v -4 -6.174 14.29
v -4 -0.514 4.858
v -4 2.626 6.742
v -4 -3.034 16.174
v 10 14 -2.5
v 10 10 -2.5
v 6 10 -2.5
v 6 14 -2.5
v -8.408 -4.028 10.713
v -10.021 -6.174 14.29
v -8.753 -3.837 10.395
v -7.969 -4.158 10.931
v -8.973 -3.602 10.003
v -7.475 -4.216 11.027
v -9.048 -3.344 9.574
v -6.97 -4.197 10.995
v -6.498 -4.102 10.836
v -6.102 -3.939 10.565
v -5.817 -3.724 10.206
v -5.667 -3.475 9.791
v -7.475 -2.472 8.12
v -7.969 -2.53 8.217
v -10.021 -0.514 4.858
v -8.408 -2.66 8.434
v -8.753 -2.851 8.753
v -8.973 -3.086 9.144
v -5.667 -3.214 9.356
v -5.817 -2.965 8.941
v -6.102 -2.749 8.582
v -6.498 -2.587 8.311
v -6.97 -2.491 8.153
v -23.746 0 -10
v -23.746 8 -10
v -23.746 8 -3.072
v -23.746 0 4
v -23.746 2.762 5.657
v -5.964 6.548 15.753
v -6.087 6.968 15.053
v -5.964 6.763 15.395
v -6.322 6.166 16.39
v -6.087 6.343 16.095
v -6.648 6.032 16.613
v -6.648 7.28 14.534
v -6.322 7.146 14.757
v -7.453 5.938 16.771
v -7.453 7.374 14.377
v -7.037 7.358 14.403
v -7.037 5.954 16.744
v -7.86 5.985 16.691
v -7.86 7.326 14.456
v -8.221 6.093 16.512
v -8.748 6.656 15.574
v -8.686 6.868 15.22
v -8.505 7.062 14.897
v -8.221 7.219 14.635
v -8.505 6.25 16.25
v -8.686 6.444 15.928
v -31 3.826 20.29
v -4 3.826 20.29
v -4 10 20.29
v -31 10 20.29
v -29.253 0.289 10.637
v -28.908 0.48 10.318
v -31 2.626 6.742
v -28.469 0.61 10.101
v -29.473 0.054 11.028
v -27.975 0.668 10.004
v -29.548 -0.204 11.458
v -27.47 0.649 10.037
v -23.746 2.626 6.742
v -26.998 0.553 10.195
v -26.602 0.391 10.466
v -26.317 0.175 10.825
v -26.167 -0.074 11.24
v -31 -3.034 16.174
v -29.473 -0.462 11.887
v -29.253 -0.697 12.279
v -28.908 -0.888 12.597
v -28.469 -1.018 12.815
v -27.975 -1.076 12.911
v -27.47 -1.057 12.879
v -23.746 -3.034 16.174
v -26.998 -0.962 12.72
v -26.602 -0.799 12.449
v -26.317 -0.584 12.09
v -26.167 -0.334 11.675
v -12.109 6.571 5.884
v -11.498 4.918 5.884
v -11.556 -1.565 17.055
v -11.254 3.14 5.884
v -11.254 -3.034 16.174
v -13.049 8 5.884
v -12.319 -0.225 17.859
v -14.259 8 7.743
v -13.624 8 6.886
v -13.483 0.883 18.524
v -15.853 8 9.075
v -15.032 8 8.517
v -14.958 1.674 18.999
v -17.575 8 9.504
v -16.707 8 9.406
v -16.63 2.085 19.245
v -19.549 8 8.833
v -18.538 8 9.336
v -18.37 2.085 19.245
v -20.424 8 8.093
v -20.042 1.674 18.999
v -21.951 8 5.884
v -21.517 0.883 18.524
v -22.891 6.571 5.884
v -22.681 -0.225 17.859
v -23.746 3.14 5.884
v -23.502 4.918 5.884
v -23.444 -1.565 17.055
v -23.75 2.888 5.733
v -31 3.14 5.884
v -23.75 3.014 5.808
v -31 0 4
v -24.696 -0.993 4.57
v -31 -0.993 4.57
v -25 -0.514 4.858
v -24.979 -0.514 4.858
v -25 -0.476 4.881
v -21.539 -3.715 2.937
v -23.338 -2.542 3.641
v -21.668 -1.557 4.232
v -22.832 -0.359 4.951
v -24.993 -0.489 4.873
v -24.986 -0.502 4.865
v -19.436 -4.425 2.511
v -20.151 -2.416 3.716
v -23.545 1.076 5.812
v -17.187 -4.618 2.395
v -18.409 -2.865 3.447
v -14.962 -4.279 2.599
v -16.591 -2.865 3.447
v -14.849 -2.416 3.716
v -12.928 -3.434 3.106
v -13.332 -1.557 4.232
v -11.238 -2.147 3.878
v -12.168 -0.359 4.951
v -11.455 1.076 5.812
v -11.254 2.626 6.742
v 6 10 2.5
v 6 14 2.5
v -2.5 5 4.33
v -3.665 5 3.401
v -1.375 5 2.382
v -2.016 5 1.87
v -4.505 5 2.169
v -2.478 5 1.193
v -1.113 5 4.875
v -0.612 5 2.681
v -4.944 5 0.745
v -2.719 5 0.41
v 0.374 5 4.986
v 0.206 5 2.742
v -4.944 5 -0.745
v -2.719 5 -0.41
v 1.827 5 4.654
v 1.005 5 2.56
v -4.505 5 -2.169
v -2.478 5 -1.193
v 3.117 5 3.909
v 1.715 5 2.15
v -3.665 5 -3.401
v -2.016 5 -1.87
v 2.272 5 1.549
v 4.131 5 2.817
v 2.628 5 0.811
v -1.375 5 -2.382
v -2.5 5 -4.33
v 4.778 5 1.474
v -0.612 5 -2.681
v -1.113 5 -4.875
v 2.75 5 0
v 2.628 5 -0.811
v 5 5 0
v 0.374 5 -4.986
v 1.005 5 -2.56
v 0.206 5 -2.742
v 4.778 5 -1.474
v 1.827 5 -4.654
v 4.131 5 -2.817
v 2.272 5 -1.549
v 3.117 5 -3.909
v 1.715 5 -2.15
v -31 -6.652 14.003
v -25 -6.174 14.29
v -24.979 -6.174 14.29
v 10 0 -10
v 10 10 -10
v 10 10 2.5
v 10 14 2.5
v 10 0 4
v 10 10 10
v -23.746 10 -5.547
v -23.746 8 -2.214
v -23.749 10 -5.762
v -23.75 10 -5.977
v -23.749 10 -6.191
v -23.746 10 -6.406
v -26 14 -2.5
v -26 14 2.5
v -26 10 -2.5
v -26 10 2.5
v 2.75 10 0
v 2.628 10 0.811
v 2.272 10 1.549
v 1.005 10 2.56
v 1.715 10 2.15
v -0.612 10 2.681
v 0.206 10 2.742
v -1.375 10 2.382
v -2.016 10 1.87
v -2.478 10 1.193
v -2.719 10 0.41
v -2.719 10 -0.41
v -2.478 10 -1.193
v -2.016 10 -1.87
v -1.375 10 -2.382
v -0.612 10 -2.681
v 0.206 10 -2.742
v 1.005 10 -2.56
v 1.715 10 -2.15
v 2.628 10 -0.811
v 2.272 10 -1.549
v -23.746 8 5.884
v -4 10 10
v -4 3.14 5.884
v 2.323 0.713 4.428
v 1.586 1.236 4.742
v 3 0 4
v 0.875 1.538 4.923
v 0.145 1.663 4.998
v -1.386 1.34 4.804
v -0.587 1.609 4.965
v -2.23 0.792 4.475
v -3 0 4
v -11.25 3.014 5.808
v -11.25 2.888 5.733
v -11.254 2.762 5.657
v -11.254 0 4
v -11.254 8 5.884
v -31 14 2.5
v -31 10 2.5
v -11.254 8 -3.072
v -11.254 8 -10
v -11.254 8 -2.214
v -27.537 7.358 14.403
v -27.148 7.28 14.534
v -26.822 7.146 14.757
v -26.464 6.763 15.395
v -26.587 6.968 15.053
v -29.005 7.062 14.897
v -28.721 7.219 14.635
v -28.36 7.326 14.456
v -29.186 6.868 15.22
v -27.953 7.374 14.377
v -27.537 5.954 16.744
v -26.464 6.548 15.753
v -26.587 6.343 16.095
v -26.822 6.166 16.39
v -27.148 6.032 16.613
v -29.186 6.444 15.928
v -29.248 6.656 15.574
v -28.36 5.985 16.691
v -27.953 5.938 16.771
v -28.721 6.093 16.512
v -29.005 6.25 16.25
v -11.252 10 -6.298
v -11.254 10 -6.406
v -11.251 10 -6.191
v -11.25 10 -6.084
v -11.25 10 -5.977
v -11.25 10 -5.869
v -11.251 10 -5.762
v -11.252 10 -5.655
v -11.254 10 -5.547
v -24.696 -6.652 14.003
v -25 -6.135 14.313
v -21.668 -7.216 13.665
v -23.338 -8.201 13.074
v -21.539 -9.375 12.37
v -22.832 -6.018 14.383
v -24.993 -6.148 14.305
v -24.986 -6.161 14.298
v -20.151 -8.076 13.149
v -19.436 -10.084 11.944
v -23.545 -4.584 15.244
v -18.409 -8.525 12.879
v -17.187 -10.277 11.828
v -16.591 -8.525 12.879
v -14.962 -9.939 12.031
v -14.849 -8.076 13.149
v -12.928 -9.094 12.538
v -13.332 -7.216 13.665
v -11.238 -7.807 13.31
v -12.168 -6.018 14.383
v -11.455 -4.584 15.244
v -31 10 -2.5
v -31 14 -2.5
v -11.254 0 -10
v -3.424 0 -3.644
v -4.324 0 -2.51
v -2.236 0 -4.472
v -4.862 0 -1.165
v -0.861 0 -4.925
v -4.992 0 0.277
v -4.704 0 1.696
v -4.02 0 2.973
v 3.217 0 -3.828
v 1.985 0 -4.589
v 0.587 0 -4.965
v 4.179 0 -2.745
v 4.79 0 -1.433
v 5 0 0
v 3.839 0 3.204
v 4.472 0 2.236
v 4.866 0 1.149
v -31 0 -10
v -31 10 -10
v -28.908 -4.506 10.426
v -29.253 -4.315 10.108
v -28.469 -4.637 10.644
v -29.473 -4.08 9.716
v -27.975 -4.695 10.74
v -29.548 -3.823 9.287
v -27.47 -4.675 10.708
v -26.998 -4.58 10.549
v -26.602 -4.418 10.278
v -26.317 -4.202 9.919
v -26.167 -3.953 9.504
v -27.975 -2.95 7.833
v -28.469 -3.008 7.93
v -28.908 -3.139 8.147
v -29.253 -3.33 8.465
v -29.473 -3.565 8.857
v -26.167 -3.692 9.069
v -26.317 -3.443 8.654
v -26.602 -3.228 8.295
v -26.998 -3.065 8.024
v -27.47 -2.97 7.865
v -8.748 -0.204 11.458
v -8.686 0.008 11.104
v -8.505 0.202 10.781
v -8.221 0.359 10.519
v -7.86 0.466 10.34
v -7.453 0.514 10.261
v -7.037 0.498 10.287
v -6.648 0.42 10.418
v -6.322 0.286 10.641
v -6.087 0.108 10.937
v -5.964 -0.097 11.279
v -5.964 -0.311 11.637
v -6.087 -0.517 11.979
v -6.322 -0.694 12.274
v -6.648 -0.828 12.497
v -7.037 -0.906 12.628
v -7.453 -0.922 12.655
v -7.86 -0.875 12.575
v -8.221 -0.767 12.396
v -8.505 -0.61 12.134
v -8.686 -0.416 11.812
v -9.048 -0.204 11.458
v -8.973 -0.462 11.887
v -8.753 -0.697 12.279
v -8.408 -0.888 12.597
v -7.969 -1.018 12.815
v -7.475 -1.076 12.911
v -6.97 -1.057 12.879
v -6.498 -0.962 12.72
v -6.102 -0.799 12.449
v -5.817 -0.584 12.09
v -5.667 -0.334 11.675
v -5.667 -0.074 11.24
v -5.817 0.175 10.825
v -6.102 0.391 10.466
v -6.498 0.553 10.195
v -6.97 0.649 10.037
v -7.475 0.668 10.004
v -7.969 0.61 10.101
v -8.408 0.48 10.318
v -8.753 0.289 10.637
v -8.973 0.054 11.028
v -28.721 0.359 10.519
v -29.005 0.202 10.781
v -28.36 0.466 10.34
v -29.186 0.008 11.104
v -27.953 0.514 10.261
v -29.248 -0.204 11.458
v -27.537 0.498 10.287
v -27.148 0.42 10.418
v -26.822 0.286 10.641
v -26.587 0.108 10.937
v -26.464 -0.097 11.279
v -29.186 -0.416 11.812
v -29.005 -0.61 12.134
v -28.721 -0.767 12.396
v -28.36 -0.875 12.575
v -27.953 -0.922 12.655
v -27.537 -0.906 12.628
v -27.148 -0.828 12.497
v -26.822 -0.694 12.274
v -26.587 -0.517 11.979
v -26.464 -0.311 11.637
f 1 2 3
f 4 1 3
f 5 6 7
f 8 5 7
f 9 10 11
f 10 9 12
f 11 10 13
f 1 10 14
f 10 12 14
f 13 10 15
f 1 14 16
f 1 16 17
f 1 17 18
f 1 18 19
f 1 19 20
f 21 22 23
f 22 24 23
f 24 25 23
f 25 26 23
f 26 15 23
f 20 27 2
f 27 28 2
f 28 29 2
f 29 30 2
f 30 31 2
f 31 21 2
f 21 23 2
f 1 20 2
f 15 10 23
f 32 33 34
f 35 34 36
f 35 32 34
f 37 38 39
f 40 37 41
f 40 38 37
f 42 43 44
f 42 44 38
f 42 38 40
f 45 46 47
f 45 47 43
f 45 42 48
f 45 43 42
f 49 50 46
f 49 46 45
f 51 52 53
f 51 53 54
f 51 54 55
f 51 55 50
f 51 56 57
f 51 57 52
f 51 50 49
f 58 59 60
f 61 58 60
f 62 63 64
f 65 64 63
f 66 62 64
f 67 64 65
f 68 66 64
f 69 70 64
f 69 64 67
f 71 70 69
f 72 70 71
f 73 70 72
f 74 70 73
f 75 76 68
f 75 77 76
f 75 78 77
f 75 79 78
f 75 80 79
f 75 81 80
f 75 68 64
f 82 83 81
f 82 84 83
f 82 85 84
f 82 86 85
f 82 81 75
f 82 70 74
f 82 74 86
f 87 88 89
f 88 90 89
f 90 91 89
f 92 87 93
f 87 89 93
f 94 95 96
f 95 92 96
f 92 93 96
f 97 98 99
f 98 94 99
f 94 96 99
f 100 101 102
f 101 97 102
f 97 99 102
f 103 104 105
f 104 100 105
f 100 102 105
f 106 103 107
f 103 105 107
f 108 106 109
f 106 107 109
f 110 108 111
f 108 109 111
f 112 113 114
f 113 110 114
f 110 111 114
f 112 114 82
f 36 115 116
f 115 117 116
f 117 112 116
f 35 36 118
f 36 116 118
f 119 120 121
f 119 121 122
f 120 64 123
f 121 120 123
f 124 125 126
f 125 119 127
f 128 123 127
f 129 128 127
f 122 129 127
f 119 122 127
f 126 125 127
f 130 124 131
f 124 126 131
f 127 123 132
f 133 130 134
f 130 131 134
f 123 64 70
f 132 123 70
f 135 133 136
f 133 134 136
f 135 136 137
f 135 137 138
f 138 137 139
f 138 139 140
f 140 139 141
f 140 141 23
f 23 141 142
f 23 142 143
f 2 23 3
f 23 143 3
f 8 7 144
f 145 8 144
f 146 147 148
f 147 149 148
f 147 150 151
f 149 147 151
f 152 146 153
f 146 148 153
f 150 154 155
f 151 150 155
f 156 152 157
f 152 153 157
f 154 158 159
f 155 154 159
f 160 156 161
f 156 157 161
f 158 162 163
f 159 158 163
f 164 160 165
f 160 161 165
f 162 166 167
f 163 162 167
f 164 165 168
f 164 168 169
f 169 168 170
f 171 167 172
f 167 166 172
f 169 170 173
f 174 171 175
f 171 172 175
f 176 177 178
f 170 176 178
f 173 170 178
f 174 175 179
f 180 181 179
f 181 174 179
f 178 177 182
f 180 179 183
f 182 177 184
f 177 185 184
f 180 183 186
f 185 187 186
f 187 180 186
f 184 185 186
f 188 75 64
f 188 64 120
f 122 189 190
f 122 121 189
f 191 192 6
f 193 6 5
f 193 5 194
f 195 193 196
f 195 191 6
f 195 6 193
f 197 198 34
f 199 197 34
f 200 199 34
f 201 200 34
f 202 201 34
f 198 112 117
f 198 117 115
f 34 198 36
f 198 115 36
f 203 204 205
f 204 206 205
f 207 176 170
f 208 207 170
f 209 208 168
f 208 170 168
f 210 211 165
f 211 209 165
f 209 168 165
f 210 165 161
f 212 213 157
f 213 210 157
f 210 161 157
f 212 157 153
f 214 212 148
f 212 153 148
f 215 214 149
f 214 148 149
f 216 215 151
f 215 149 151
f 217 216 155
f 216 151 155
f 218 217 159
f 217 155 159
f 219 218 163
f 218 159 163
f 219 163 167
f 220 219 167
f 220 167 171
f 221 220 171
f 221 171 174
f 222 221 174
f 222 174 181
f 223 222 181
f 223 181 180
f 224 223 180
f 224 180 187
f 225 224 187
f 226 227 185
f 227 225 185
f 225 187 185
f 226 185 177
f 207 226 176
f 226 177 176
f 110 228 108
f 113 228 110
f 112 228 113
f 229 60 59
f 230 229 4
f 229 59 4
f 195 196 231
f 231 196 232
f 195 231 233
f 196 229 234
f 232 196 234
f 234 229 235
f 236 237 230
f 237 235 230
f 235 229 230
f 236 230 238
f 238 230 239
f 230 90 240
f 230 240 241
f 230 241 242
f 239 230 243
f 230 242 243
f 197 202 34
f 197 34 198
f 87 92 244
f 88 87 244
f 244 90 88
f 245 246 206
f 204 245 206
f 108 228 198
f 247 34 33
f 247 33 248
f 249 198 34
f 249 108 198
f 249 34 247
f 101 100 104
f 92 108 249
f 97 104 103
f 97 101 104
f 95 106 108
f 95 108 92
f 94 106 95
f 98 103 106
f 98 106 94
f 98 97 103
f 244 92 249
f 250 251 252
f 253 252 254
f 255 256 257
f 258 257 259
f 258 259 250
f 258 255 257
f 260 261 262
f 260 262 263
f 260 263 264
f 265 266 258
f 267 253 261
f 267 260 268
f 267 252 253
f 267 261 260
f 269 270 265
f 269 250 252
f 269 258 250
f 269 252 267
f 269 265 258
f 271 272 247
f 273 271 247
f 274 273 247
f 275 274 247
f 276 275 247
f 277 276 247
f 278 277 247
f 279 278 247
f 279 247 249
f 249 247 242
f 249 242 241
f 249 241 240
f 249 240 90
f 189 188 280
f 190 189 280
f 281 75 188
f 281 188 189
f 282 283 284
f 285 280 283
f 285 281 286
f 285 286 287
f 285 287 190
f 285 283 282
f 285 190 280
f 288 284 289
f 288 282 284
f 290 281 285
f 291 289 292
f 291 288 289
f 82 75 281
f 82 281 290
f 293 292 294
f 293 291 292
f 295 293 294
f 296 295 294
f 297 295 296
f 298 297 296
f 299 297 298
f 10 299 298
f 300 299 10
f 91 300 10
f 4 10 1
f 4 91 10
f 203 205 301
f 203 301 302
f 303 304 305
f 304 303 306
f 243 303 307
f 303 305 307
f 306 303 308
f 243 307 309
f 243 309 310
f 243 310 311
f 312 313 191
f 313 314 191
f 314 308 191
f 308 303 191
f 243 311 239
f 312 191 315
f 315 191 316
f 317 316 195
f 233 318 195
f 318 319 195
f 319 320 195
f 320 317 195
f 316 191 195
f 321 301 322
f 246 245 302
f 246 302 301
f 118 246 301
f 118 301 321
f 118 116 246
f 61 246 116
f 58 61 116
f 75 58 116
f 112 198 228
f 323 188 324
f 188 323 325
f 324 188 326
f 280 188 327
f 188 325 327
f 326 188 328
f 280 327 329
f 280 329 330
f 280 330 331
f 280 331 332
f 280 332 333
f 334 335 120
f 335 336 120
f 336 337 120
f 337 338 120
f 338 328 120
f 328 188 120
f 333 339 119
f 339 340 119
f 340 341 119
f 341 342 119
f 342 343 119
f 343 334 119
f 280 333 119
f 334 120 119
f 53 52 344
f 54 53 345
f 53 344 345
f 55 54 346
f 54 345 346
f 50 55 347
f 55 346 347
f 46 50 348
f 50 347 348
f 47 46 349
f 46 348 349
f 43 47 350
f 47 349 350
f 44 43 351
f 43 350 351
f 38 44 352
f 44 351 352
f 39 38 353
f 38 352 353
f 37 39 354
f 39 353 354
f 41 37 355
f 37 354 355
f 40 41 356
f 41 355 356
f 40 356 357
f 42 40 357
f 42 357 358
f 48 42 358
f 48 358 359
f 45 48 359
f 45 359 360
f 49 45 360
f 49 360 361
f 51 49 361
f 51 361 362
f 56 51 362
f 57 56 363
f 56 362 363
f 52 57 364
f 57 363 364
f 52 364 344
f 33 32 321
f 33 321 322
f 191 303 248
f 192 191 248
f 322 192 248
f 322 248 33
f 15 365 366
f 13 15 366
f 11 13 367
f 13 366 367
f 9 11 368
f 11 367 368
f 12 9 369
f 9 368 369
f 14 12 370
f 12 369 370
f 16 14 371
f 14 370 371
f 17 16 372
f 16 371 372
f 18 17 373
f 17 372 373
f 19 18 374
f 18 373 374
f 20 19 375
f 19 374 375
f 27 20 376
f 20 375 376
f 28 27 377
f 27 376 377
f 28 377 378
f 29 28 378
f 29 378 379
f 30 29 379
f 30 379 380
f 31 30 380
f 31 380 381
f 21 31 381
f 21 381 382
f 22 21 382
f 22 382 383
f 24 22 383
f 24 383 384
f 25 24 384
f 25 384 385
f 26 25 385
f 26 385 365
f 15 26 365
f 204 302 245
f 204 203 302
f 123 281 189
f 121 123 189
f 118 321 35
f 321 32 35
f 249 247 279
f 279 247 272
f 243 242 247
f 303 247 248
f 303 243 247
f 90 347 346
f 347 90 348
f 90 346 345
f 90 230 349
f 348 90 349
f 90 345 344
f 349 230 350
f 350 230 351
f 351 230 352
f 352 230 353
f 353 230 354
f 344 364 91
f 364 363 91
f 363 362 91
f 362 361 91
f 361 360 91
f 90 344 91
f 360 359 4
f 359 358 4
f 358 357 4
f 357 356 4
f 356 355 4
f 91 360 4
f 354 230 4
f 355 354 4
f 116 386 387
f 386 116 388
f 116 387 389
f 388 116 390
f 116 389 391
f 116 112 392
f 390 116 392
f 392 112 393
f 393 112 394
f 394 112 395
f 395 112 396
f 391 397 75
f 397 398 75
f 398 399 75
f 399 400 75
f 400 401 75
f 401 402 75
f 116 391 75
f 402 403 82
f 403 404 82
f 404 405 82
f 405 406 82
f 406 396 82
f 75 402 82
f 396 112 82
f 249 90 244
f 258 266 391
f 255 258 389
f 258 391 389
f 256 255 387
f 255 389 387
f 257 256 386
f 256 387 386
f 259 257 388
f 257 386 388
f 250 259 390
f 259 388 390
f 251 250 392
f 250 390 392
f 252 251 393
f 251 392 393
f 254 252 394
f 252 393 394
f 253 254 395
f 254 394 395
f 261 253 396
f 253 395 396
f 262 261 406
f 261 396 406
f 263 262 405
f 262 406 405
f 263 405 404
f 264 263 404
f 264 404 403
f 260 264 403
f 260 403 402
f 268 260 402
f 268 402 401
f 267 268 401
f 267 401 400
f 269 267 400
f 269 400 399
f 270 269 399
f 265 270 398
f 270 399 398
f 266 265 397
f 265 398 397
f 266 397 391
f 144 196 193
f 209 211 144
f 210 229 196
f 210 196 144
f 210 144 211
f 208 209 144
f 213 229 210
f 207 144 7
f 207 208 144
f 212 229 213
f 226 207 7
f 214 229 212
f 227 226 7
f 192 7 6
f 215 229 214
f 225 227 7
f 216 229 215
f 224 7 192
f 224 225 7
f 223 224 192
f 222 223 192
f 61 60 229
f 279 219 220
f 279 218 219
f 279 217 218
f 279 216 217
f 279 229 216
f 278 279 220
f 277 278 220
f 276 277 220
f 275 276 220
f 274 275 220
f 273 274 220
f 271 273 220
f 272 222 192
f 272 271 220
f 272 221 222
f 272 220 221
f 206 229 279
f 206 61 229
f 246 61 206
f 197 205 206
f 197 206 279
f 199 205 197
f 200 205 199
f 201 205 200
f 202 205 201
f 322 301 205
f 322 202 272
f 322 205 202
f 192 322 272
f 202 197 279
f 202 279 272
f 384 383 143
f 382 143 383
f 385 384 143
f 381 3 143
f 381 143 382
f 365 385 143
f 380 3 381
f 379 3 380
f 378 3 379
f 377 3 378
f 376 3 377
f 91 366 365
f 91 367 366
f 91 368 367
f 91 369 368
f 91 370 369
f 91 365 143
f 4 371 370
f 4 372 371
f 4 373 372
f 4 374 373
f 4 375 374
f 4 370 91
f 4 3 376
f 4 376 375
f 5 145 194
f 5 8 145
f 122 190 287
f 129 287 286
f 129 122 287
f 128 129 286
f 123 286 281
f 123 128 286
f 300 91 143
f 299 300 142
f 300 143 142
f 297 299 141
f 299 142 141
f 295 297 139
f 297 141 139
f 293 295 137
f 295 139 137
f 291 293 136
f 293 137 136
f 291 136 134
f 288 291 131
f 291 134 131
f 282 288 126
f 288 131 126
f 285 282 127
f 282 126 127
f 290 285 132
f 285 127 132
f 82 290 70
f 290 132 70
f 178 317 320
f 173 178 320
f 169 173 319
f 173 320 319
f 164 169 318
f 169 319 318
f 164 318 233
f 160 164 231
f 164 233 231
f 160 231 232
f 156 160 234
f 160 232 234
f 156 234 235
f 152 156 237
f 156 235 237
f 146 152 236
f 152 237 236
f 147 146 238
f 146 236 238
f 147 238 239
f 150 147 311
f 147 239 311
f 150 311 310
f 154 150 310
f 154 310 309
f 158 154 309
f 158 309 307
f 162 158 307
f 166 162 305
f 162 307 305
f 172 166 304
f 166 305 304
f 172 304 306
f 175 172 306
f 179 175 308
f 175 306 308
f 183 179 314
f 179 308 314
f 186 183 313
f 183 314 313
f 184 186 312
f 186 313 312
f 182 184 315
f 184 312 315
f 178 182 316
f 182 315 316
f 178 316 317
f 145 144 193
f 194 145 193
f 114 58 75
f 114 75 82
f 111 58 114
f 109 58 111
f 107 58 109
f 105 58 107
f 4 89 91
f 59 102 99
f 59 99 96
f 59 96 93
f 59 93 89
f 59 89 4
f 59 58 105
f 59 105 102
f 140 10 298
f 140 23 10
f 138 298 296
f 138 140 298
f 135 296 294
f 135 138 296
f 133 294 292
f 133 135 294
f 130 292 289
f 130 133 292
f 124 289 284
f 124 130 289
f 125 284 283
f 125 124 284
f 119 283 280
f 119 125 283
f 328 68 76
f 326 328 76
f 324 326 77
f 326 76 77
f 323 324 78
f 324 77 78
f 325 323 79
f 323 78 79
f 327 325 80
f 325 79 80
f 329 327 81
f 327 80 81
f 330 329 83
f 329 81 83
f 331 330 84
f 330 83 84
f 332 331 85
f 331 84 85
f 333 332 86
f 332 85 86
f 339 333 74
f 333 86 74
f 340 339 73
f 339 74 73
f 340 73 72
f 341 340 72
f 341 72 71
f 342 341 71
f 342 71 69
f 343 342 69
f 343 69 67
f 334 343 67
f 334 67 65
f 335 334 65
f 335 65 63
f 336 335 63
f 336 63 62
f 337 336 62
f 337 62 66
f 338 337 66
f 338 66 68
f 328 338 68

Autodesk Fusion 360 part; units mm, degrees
sketch "Sketch1" plane through (0, 0, 0) normal (0, 1, 0) x (1, 0, 0)
  circle A0 centre (0, 0) radius 2.75
  line L0 (10, -10) -> (-10, -10)
  line L1 (-10, -10) -> (-10, 10)
  line L2 (-10, 10) -> (10, 10)
  line L3 (10, 10) -> (10, -10)
  line L4 (10, -10) -> (-10, 10) construction
  line L5 (-10, -10) -> (10, 10) construction
  line L6 (-25, -2.5) -> (-21, -2.5)
  line L7 (-21, -2.5) -> (-21, 2.5)
  line L8 (-21, 2.5) -> (-25, 2.5)
  line L9 (-25, 2.5) -> (-25, -2.5)
  line L10 (6, 2.5) -> (6, -2.5)
  line L11 (6, -2.5) -> (10, -2.5)
  line L12 (10, 2.5) -> (6, 2.5)
  line L13 (10, -2.5) -> (10, 2.5)
  line L14 (-10, -10) -> (-25, -10)
  line L15 (-25, -10) -> (-25, 10)
  line L16 (-25, 10) -> (-10, 10)
  line L17 (-10, 10) -> (-10, -10)
  circle A1 centre (0, 0) radius 5
  line L18 (-25, -10) -> (-5, -10)
  line L19 (-5, -10) -> (-5, 10)
  line L20 (-5, 10) -> (-25, 10)
  line L21 (-25, 10) -> (-25, -10)
  line L22 (-25, -10) -> (-5, -10)
  line L23 (-5, -10) -> (-5, -20)
  line L24 (-5, -20) -> (-25, -20)
  line L25 (-25, -20) -> (-25, -10)
  line L26 (-25, 10) -> (-5, 10)
  line L27 (-5, 10) -> (-5, 15.5067)
  line L28 (-5, 15.5067) -> (-25, 15.5067)
  line L29 (-25, 15.5067) -> (-25, 10)
  dimension "d1" = 5.5
  dimension "d2" = 20
  dimension "d3" = 20
  dimension "d4" = 4
  dimension "d5" = 5
  dimension "d6" = 4
  dimension "d7" = 5
  dimension "d8" = 10
  dimension "d15" = 20
  dimension "d16" = 20
extrude "Extrude1" add sketch "Sketch1" along normal blind 14 contours L3 L10 L11 L12 L13 | L6 L7 L8 L9 L15 L21 makes body 1 at (-25, 4.6667, -0.8333) makes body 2 at (6, 4.6667, -0.8333)
extrude "Extrude2" add sketch "Sketch1" along normal blind 10 contours A1 | L0 L2 L3 L10 L11 L12 L19 | L0 L1 L2 L17 L18 L19 L20 L22 L26 | L1 L6 L7 L8 L14 L15 L16 L17 L18 L20 L21 L22 L26 bodies 1 2
extrude "Extrude3" cut sketch "Sketch1" along normal blind 5 contours A1 bodies 1
sketch "Sketch2" plane through (-25, 0, 0) normal (-1, 0, 0) x (0, -1, 0)
  line L0 (0, -10) -> (0, 10)
  line L1 (0, 10) -> (-10, 10)
  line L2 (-10, 10) -> (-10, 2.5)
  line L3 (-10, 2.5) -> (-14, 2.5)
  line L4 (-14, 2.5) -> (-14, -2.5)
  line L5 (-14, -2.5) -> (-10, -2.5)
  line L6 (-10, -2.5) -> (-10, -10)
  line L7 (-10, -10) -> (0, -10)
  line L8 (-10, 10) -> (0, 4)
  line L9 (0, 10) -> (0, 4)
  line L10 (0, 10) -> (-10, 10)
extrude "Extrude4" cut sketch "Sketch2" against normal blind 45 contours L0 L1 L8 L9 L10 bodies 1
sketch "Sketch3" plane through (0, -1.7647, 2.9412) normal (0, -0.5145, 0.8575) x (1, 0, 0)
  line L0 (-25, 13.7199) -> (-25, 2.058)
  line L1 (3, 2.058) -> (10, 2.058)
  line L2 (10, 13.7199) -> (-25, 13.7199)
  circle A0 centre (-17.5, 5.5) radius 6.25
  circle A1 centre (-17.5, 5.5) radius 8.2333
  ellipse E0 centre (0, -5.7166) end of major axis (0, -15.4349) minor radius 5 (3, 2.058) -> (-3, 2.058) ccw
  line L3 (10, 2.058) -> (10, 13.7199)
  line L4 (-25, 2.058) -> (-3, 2.058)
  line L5 (-4, 9.5) -> (-31, 9.5)
  line L6 (-31, 9.5) -> (-31, 1.5)
  line L7 (-31, 1.5) -> (-4, 1.5)
  line L8 (-4, 1.5) -> (-4, 9.5)
  line L9 (-4, 9.5) -> (-31, 1.5) construction
  line L10 (-31, 9.5) -> (-4, 1.5) construction
  line L11 (-25, 13.7199) -> (-31, 13.7199)
  line L12 (-31, 13.7199) -> (-31, 9.5)
  line L13 (-31, 1.5) -> (-31, -3)
  line L14 (-17.5, -2.7333) -> (-31, -2.7333)
  line L15 (-4, 9.5) -> (-4, 10)
  line L16 (-4, 10) -> (-4, 13.7199)
  line L17 (-4, 13.7199) -> (-25, 13.7199)
  line L18 (-4, 1.5) -> (-4, -2.7333)
  line L19 (-4, -2.7333) -> (-17.5, -2.7333)
  point P0 (-17.5, 5.5)
  dimension "d19" = 12.5
  dimension "d20" = 27
  dimension "d21" = 8
extrude "Extrude5" add sketch "Sketch3" along normal blind 12 separate body contours L0 L2 A1 L5 L17 | L0 L5 L11 L12 | L0 A1 L5 | L0 A1 L4 L5 L6 L7 | L2 A0 A1 L5 L17 | L0 A0 A1 L4 L5 | L0 A1 | L2 A1 L5 L15 L16 L17 | A1 L4 L5 L8 | A0 A1 L4 L5 | A0 A1 L4 L7 | A0 A1 L7 | A0 A1 L4 L7 makes body 3
extrude "Extrude6" add 1 faces at (-25, 6.6667, 5.5) along direction (-1, 0, 0) blind 6 on bodies 1 bodies 1
extrude "Extrude7" cut 1 faces at (-21, 11.3333, 0.8333) along direction (-1, 0, 0) blind 5 on bodies 1 bodies 1
extrude "Extrude8" cut sketch "Sketch3" against normal blind 27 contours A0 L4 L5 | A0 L5 | A0 L4 L7 | A0 L7 bodies 1
ref_plane "WorkPlane1" through (-17.5, 0.0531, 11.029) normal (0, 0.8575, 0.5145) x (-1, 0, 0)
split "Split1" by plane through (-17.5, 0.0531, 11.029) normal (0, 0.8575, 0.5145) bodies 3 makes body 4 at (-13, 7.942, 13.43)
extrude "Extrude9" cut 1 faces at (-29, 0.9001, 4.5401) along direction (0, -0.514496, 0.857493) blind 1 on bodies 3 bodies 3
sketch "Sketch4" plane through (-17.5, 1.0821, 9.314) normal (0, 0.8575, 0.5145) x (-1, 0, 0)
  line L0 (-13.5, -3) -> (-13.5, 8) construction
  line L1 (-7.4793, -3) -> (-13.5, -3) construction
  line L2 (13.5, -3) -> (7.1964, -3) construction
  line L3 (13.5, -3) -> (13.5, 8) construction
  line L4 (13.5, 8) -> (7.1964, -3) construction
  line L5 (-7.4793, -3) -> (-8.3257, -0.4851) construction
  line L6 (-8.3257, -0.4851) -> (-13.5, 8) construction
  circle A0 centre (10.3482, 2.5) radius 1.4
  circle A1 centre (10.3482, 2.5) radius 1.7
  circle A2 centre (-10.1518, 2.5) radius 1.7
  circle A3 centre (-10.1518, 2.5) radius 1.4
  dimension "d35" = 2.8
  dimension "d36" = 3.4
  dimension "d37" = 2.8
  dimension "d38" = 3.4
extrude "Extrude10" cut sketch "Sketch4" against normal blind 7.5 contours A0 | A1 | A2 | A3 bodies 3
extrude "Extrude11" cut sketch "Sketch4" along normal blind 18 contours A0 | A3 bodies 4
sketch "Sketch5" plane through (-31, 0, 0) normal (-1, 0, 0) x (0, -1, 0)
  line L0 (0, 4) -> (-10, 10)
  line L1 (-10, 10) -> (-10, 2.5)
  line L2 (-10, 2.5) -> (-14, 2.5)
  line L3 (-14, 2.5) -> (-14, -2.5)
  line L4 (-14, -2.5) -> (-10, -2.5)
  line L5 (-10, -2.5) -> (-10, -10)
  line L6 (-10, -10) -> (0, -10)
  line L7 (0, -10) -> (0, 4)
  line L8 (-10, 10) -> (-3.8261, 20.2899)
  line L9 (-3.8261, 20.2899) -> (-10, 20.2899)
  line L10 (-10, 20.2899) -> (-10, 10)
extrude "Extrude12" add sketch "Sketch5" against normal blind 27 contours L8 L9 L10 bodies 4 1
sketch "Sketch6" plane through (0, 0, 0) normal (0, -1, 0) x (1, 0, 0)
  ellipse E0 centre (-17.5, 10.6901) end of major axis (-17.5, -1.4577) minor radius 6.25 (-22.7168, 4) -> (-12.2832, 4) ccw
  line L0 (-22.7168, 4) -> (-31, 4)
  line L1 (-31, 4) -> (-31, -10)
  line L2 (-31, -10) -> (10, -10)
  line L3 (10, -10) -> (10, 4)
  line L4 (10, 4) -> (3, 4)
  arc A0 (-3, 4) -> (3, 4) centre (0, 0) ccw
  line L5 (-3, 4) -> (-12.2832, 4)
  line L6 (-23.7461, 5.884) -> (-11.2539, 5.884)
  line L7 (-11.2539, 5.884) -> (-11.2539, -10)
  line L8 (-11.2539, -10) -> (-23.7461, -10)
  line L9 (-23.7461, -10) -> (-23.7461, 5.884)
  point P0 (-23.7461, 5.884)
  point P1 (-11.2539, 5.884)
extrude "Extrude13" cut sketch "Sketch6" against normal blind 24 contours E0 L0 L5 L6 L7 L9 | E0 L0 L2 L5 L7 L8 L9 bodies 4
extrude "Extrude14" add sketch "Sketch6" along normal blind -10 and the other way blind 8 contours E0 L0 L5 L6 L7 L9 | E0 L0 L2 L5 L7 L8 L9 bodies 4
extrude "Extrude15" add 1 faces at (-19.3073, 8.6857, 5.884) along direction (0, 0, 1) blind 7 on bodies 4 bodies 4
